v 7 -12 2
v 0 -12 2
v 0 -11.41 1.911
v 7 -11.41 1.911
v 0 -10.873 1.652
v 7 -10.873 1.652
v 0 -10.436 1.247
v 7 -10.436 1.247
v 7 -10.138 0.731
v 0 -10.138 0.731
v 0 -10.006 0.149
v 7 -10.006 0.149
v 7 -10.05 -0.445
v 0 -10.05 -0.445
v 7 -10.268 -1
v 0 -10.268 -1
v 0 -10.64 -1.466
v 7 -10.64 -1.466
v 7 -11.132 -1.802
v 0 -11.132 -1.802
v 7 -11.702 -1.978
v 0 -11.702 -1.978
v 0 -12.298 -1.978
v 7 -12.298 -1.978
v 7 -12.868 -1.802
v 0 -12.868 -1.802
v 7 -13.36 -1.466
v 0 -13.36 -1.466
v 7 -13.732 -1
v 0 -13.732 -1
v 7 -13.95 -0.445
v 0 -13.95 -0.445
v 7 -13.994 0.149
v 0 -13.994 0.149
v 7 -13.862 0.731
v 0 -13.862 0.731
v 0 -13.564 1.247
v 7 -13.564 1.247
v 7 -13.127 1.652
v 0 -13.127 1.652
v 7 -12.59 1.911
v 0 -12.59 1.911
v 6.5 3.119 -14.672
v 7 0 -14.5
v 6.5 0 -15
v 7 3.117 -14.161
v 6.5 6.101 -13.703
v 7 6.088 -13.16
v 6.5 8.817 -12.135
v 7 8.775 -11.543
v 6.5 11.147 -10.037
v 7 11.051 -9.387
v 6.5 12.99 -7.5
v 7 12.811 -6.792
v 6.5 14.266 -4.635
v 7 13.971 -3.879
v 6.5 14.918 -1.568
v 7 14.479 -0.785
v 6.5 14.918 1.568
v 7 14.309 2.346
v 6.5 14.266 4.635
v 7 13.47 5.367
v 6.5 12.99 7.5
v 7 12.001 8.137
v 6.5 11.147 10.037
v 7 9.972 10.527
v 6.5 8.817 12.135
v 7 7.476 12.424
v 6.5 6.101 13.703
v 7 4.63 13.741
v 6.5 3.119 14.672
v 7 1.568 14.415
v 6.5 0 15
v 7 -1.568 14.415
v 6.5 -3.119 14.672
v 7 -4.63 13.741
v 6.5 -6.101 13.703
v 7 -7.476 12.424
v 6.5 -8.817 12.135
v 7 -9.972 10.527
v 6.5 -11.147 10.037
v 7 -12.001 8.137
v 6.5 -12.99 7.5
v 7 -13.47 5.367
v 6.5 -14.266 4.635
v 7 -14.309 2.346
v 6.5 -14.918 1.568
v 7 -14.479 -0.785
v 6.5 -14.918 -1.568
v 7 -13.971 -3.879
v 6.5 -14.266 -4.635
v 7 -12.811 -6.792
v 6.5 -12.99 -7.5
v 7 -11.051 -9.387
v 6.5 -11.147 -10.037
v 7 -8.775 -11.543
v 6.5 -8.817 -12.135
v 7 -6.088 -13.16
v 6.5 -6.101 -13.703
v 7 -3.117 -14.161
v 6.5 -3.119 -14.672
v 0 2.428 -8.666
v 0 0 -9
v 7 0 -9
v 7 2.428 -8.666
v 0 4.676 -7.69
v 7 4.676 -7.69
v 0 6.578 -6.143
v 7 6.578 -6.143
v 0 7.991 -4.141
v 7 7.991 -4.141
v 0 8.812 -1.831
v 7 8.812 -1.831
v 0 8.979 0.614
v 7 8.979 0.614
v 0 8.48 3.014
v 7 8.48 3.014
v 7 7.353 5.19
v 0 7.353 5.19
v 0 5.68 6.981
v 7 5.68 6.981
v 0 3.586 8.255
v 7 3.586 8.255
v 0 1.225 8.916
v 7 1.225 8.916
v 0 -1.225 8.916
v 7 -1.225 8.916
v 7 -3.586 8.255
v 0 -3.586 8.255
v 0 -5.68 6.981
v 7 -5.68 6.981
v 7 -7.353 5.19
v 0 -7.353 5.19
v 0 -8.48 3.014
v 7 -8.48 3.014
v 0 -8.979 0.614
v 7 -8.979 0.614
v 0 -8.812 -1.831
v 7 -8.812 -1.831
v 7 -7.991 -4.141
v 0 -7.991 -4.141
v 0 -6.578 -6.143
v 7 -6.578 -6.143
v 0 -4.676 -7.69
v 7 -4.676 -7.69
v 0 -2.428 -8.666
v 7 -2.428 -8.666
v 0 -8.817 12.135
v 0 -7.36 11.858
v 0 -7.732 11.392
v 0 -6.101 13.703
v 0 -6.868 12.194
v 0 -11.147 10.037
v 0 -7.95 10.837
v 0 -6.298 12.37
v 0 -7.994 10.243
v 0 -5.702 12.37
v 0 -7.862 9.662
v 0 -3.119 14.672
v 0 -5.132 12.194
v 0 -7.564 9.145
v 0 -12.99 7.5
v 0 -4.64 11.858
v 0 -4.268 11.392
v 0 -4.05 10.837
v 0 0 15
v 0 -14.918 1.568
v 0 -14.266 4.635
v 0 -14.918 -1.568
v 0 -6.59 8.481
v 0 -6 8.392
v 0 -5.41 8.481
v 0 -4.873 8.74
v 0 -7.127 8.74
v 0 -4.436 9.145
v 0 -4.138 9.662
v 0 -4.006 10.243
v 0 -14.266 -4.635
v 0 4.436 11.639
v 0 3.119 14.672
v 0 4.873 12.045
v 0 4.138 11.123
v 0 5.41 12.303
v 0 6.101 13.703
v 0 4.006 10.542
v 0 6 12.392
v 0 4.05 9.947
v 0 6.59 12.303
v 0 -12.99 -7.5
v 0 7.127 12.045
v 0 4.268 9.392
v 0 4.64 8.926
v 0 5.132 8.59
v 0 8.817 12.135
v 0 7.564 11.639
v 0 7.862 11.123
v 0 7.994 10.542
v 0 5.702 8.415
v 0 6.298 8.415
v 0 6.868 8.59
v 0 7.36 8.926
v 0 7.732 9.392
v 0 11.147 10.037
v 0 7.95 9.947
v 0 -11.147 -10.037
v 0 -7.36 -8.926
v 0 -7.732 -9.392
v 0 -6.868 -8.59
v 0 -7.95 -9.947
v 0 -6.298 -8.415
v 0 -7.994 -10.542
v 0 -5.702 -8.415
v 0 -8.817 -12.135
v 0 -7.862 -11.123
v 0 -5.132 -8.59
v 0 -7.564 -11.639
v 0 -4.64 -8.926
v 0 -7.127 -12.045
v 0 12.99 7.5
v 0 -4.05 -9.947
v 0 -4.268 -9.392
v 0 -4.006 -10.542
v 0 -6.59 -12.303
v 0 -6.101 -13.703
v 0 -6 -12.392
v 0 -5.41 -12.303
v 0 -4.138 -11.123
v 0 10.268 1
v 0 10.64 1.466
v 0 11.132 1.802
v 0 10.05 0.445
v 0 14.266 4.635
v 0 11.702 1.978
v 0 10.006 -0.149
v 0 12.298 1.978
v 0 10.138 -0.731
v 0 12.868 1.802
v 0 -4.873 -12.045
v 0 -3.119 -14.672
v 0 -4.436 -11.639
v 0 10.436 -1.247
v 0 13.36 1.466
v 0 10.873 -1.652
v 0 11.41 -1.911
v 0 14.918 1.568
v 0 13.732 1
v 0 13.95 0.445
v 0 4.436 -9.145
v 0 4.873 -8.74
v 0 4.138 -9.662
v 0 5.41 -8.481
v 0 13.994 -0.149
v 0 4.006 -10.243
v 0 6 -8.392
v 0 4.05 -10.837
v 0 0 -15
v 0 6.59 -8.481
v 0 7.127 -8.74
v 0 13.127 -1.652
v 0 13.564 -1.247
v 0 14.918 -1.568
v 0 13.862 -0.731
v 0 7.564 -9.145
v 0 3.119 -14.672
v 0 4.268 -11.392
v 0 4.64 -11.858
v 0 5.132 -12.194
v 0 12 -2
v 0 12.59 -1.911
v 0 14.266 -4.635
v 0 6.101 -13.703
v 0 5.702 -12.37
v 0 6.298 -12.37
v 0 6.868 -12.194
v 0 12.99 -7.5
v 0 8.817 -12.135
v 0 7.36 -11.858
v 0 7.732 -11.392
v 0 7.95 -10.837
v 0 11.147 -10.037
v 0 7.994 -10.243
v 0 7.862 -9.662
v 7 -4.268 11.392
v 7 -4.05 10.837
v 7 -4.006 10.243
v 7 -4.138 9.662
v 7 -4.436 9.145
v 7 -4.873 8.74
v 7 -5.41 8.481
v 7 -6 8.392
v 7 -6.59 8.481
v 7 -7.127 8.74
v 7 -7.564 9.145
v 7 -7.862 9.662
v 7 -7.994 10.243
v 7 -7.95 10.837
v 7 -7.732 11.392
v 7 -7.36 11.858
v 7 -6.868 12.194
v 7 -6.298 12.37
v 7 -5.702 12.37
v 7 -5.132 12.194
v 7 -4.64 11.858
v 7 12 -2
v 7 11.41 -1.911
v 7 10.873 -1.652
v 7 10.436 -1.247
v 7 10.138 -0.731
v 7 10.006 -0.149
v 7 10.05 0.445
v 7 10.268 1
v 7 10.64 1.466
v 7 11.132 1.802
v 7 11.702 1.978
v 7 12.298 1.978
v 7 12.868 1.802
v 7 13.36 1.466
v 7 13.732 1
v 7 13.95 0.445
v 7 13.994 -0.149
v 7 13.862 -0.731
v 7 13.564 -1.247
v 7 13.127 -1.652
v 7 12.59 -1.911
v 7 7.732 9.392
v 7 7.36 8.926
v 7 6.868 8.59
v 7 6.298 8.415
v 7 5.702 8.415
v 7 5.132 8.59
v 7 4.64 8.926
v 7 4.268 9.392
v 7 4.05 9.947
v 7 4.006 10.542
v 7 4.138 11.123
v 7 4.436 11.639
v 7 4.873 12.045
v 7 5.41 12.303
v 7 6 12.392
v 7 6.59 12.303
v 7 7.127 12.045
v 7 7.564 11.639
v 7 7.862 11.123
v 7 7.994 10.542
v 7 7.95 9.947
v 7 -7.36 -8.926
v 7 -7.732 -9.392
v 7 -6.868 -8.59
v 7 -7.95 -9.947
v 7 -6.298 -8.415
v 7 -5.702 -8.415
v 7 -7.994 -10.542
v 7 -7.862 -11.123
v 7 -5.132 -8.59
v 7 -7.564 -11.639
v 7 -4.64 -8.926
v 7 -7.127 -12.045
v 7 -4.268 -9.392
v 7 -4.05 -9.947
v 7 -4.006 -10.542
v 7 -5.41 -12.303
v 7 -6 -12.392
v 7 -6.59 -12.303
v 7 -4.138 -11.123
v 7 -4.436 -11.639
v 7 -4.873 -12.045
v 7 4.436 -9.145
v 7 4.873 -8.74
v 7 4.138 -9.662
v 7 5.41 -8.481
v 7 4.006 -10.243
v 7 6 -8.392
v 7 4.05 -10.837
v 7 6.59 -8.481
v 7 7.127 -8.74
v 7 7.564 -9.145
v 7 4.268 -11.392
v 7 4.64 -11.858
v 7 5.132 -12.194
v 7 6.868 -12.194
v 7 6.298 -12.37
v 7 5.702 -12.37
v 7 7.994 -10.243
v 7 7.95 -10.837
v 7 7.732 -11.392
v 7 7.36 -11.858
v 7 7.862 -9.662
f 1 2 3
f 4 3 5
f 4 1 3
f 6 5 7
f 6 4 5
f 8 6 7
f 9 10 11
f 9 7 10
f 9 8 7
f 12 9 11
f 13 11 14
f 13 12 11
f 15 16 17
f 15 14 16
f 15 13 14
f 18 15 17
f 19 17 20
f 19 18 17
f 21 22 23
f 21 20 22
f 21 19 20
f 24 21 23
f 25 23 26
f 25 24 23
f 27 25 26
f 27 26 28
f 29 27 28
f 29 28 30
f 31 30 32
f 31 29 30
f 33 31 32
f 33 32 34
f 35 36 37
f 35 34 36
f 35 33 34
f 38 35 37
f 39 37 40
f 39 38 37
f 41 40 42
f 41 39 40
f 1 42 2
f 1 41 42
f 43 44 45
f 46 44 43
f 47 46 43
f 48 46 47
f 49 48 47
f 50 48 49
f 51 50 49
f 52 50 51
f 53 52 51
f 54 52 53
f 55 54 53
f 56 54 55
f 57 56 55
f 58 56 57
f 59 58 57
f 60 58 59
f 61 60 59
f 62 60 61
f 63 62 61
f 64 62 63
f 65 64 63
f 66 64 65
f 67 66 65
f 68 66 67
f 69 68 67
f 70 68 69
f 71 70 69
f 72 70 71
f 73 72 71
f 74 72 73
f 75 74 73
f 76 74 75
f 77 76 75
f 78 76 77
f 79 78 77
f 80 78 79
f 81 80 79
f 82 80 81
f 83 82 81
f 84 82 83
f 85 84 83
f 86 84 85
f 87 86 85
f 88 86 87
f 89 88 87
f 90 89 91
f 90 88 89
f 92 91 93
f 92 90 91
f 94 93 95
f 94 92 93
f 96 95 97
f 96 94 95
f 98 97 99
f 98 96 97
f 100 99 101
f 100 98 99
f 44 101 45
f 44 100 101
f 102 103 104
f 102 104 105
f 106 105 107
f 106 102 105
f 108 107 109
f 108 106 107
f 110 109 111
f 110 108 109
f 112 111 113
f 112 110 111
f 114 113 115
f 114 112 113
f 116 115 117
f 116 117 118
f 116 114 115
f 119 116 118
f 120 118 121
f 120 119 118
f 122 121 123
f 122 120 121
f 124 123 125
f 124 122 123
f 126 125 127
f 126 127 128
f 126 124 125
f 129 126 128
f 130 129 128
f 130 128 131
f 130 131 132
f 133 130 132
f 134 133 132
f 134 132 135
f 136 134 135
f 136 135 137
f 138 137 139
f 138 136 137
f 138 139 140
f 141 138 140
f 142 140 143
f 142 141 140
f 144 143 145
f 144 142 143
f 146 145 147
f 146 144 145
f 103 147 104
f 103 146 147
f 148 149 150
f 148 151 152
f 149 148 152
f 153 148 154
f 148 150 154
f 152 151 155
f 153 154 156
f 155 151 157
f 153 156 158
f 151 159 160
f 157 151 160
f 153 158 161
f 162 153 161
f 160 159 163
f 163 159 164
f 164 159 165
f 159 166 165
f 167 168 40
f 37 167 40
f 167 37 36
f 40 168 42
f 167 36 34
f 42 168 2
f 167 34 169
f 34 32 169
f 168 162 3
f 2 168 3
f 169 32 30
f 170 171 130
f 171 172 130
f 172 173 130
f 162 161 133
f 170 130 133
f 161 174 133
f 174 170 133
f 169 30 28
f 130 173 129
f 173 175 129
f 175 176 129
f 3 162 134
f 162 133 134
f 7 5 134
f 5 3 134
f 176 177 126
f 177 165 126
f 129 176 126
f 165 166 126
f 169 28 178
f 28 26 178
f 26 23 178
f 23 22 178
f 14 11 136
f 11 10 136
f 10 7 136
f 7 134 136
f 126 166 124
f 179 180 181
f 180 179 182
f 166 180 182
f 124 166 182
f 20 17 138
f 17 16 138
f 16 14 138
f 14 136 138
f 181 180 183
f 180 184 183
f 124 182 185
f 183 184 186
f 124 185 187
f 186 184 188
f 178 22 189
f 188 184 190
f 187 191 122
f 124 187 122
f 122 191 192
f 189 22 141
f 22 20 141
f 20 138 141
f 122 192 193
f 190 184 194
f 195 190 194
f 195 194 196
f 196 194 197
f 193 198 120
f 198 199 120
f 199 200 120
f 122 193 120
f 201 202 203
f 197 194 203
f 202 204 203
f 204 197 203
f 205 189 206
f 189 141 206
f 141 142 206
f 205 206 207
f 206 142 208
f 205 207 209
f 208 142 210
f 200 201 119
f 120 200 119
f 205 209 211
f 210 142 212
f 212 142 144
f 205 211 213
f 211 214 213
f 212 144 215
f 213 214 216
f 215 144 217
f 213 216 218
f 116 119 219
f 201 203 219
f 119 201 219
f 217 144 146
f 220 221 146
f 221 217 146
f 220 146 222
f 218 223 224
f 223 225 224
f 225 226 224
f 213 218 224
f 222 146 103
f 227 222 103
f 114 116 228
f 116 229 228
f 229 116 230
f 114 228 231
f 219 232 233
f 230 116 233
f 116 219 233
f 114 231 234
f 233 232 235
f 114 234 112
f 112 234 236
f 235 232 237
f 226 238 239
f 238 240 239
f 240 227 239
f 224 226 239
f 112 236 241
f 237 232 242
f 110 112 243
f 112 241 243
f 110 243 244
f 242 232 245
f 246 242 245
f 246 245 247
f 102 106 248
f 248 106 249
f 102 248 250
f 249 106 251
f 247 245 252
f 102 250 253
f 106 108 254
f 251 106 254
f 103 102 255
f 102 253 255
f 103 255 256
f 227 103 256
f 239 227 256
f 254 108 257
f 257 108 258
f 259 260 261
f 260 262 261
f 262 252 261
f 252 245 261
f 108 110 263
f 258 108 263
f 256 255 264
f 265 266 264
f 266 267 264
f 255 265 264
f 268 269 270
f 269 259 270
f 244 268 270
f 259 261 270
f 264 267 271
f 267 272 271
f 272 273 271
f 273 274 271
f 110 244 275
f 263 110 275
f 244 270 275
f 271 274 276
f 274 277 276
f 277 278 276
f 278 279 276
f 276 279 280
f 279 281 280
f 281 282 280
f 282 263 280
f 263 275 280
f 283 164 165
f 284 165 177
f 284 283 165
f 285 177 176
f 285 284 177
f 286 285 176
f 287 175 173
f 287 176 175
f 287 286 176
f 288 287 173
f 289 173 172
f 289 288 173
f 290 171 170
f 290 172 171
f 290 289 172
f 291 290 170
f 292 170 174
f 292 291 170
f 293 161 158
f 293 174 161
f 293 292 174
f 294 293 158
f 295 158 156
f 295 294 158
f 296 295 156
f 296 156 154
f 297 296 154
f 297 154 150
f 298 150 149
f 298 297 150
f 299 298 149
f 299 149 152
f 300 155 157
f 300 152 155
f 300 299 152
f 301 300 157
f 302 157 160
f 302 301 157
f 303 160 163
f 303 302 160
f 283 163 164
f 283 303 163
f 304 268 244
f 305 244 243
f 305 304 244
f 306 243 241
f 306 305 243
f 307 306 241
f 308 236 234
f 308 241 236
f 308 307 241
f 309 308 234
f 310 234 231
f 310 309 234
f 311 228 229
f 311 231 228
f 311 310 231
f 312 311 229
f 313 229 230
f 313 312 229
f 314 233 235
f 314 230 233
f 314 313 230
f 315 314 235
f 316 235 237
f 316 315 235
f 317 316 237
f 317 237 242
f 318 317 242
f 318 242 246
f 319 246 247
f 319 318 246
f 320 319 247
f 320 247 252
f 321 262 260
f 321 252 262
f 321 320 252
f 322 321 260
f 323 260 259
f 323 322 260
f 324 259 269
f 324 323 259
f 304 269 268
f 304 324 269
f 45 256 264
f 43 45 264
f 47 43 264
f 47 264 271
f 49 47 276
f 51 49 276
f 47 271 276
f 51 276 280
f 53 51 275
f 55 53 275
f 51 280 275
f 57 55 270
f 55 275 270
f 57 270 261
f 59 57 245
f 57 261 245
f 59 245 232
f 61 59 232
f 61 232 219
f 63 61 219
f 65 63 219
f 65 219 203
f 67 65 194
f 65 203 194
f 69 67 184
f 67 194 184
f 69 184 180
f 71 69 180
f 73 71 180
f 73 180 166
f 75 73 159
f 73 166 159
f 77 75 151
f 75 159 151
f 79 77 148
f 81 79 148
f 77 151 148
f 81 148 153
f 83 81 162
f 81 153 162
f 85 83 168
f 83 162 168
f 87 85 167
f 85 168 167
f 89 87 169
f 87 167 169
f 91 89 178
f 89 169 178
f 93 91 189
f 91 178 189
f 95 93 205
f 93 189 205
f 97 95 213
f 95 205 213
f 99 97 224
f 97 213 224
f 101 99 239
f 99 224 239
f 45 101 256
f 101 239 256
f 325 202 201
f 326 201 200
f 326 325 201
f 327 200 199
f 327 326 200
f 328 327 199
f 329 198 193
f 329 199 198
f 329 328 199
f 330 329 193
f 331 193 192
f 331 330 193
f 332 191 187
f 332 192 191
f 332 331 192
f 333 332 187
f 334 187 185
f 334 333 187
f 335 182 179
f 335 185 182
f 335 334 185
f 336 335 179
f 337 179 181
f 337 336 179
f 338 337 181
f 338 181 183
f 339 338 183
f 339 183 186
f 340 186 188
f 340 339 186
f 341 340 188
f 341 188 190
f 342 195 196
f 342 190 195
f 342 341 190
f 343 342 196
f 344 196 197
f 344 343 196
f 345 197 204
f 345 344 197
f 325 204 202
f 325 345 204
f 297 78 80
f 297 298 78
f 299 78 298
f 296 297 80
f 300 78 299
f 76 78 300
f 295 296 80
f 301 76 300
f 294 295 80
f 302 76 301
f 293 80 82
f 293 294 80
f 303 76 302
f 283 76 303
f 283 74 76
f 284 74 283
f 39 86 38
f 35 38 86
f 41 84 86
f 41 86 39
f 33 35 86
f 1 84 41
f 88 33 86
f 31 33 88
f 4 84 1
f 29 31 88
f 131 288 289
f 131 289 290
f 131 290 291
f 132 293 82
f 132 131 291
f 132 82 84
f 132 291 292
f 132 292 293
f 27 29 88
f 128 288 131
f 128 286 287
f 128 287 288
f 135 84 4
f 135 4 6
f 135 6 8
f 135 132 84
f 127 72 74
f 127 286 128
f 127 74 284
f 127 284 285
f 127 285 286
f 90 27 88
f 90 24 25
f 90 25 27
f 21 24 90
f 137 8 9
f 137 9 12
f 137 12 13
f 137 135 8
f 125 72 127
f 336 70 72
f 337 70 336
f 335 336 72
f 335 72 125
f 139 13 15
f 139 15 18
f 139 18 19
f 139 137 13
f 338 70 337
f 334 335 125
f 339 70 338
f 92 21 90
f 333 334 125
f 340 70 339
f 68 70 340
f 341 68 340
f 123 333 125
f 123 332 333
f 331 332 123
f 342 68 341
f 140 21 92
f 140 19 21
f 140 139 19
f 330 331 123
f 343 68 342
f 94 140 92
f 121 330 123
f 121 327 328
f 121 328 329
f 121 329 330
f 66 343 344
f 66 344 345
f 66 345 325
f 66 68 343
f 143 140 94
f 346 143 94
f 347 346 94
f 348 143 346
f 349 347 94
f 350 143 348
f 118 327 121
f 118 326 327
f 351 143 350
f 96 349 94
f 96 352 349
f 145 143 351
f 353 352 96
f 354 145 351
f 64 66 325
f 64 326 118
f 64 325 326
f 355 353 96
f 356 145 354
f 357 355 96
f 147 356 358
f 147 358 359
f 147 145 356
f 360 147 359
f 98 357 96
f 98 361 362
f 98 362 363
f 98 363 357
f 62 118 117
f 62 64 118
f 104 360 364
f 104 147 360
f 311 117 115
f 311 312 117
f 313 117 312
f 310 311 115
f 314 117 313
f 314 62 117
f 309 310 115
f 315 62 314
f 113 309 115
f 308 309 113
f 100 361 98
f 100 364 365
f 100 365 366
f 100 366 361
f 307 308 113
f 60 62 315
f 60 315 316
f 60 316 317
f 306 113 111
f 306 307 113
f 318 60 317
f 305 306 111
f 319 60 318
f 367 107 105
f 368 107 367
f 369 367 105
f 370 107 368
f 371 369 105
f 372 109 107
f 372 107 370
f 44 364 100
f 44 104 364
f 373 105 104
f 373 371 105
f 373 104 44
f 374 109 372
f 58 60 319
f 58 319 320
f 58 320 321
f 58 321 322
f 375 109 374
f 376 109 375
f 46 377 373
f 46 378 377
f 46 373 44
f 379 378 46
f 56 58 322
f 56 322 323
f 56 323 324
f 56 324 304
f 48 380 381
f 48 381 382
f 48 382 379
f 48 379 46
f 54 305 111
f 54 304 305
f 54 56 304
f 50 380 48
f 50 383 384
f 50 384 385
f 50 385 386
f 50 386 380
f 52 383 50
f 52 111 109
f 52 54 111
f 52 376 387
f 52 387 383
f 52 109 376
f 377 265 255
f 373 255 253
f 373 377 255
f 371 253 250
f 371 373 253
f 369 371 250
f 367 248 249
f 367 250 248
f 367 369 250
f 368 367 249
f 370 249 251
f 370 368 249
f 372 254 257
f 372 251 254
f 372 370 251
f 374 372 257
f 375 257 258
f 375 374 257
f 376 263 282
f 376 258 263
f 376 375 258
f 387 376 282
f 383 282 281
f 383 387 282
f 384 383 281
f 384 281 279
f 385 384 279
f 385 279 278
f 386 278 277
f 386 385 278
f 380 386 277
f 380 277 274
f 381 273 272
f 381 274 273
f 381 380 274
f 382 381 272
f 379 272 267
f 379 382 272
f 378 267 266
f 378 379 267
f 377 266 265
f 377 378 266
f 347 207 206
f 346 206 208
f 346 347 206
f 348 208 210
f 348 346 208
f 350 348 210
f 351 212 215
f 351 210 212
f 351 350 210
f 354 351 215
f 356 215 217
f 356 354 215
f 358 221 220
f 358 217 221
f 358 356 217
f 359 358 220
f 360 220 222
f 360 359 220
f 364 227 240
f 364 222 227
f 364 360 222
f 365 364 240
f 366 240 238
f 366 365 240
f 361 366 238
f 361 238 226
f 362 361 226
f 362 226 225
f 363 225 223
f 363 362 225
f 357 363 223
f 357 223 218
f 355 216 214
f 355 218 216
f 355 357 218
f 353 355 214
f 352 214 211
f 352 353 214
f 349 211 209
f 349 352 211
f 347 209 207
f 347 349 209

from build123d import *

# Parameters (mm, degrees)
SKETCH1_R           = 15
SKETCH1_R_2         = 9
BOSS_EXTRUDE1_DEPTH = 7
CIRPATTERN1_COUNT   = 6
CHAMFER1_SIZE       = 0.5


with BuildPart() as part:
    # Sketch1 → Boss-Extrude1 (new body)
    with BuildSketch(Plane(origin=(0, 0, 0), x_dir=(0, 0, -1), z_dir=(1, 0, 0))):
        Circle(SKETCH1_R)
        Circle(SKETCH1_R_2, mode=Mode.SUBTRACT)
    extrude(amount=BOSS_EXTRUDE1_DEPTH)

    # Sketch3 → Ø4.0mm Dowel Hole1 (revolve, cut)
    with BuildSketch(Plane(origin=(7, 12, 0), x_dir=(0, 0, -1), z_dir=(0, 1, 0))):
        Polygon((0, 0), (0, 51.201721238), (2, 50), (2, 0), align=None)
    f_4_0mm_dowel_hole1 = revolve(axis=Axis((13.35, 12, 0), (-1, 0, 0)), mode=Mode.SUBTRACT)

    # CirPattern1: Ø4.0mm Dowel Hole1 ×6 about axis
    cirpattern1_axis = Axis((0, 0, 0), (1, 0, 0))
    for i in range(1, CIRPATTERN1_COUNT):
        add(f_4_0mm_dowel_hole1.rotate(cirpattern1_axis, i * 360 / CIRPATTERN1_COUNT), mode=Mode.SUBTRACT)

    # Chamfer1
    chamfer1_edges = [part.edges().sort_by_distance(p)[0] for p in [
        (7, 0, 15),
    ]]
    chamfer(chamfer1_edges, length=CHAMFER1_SIZE)


solid = part.part
